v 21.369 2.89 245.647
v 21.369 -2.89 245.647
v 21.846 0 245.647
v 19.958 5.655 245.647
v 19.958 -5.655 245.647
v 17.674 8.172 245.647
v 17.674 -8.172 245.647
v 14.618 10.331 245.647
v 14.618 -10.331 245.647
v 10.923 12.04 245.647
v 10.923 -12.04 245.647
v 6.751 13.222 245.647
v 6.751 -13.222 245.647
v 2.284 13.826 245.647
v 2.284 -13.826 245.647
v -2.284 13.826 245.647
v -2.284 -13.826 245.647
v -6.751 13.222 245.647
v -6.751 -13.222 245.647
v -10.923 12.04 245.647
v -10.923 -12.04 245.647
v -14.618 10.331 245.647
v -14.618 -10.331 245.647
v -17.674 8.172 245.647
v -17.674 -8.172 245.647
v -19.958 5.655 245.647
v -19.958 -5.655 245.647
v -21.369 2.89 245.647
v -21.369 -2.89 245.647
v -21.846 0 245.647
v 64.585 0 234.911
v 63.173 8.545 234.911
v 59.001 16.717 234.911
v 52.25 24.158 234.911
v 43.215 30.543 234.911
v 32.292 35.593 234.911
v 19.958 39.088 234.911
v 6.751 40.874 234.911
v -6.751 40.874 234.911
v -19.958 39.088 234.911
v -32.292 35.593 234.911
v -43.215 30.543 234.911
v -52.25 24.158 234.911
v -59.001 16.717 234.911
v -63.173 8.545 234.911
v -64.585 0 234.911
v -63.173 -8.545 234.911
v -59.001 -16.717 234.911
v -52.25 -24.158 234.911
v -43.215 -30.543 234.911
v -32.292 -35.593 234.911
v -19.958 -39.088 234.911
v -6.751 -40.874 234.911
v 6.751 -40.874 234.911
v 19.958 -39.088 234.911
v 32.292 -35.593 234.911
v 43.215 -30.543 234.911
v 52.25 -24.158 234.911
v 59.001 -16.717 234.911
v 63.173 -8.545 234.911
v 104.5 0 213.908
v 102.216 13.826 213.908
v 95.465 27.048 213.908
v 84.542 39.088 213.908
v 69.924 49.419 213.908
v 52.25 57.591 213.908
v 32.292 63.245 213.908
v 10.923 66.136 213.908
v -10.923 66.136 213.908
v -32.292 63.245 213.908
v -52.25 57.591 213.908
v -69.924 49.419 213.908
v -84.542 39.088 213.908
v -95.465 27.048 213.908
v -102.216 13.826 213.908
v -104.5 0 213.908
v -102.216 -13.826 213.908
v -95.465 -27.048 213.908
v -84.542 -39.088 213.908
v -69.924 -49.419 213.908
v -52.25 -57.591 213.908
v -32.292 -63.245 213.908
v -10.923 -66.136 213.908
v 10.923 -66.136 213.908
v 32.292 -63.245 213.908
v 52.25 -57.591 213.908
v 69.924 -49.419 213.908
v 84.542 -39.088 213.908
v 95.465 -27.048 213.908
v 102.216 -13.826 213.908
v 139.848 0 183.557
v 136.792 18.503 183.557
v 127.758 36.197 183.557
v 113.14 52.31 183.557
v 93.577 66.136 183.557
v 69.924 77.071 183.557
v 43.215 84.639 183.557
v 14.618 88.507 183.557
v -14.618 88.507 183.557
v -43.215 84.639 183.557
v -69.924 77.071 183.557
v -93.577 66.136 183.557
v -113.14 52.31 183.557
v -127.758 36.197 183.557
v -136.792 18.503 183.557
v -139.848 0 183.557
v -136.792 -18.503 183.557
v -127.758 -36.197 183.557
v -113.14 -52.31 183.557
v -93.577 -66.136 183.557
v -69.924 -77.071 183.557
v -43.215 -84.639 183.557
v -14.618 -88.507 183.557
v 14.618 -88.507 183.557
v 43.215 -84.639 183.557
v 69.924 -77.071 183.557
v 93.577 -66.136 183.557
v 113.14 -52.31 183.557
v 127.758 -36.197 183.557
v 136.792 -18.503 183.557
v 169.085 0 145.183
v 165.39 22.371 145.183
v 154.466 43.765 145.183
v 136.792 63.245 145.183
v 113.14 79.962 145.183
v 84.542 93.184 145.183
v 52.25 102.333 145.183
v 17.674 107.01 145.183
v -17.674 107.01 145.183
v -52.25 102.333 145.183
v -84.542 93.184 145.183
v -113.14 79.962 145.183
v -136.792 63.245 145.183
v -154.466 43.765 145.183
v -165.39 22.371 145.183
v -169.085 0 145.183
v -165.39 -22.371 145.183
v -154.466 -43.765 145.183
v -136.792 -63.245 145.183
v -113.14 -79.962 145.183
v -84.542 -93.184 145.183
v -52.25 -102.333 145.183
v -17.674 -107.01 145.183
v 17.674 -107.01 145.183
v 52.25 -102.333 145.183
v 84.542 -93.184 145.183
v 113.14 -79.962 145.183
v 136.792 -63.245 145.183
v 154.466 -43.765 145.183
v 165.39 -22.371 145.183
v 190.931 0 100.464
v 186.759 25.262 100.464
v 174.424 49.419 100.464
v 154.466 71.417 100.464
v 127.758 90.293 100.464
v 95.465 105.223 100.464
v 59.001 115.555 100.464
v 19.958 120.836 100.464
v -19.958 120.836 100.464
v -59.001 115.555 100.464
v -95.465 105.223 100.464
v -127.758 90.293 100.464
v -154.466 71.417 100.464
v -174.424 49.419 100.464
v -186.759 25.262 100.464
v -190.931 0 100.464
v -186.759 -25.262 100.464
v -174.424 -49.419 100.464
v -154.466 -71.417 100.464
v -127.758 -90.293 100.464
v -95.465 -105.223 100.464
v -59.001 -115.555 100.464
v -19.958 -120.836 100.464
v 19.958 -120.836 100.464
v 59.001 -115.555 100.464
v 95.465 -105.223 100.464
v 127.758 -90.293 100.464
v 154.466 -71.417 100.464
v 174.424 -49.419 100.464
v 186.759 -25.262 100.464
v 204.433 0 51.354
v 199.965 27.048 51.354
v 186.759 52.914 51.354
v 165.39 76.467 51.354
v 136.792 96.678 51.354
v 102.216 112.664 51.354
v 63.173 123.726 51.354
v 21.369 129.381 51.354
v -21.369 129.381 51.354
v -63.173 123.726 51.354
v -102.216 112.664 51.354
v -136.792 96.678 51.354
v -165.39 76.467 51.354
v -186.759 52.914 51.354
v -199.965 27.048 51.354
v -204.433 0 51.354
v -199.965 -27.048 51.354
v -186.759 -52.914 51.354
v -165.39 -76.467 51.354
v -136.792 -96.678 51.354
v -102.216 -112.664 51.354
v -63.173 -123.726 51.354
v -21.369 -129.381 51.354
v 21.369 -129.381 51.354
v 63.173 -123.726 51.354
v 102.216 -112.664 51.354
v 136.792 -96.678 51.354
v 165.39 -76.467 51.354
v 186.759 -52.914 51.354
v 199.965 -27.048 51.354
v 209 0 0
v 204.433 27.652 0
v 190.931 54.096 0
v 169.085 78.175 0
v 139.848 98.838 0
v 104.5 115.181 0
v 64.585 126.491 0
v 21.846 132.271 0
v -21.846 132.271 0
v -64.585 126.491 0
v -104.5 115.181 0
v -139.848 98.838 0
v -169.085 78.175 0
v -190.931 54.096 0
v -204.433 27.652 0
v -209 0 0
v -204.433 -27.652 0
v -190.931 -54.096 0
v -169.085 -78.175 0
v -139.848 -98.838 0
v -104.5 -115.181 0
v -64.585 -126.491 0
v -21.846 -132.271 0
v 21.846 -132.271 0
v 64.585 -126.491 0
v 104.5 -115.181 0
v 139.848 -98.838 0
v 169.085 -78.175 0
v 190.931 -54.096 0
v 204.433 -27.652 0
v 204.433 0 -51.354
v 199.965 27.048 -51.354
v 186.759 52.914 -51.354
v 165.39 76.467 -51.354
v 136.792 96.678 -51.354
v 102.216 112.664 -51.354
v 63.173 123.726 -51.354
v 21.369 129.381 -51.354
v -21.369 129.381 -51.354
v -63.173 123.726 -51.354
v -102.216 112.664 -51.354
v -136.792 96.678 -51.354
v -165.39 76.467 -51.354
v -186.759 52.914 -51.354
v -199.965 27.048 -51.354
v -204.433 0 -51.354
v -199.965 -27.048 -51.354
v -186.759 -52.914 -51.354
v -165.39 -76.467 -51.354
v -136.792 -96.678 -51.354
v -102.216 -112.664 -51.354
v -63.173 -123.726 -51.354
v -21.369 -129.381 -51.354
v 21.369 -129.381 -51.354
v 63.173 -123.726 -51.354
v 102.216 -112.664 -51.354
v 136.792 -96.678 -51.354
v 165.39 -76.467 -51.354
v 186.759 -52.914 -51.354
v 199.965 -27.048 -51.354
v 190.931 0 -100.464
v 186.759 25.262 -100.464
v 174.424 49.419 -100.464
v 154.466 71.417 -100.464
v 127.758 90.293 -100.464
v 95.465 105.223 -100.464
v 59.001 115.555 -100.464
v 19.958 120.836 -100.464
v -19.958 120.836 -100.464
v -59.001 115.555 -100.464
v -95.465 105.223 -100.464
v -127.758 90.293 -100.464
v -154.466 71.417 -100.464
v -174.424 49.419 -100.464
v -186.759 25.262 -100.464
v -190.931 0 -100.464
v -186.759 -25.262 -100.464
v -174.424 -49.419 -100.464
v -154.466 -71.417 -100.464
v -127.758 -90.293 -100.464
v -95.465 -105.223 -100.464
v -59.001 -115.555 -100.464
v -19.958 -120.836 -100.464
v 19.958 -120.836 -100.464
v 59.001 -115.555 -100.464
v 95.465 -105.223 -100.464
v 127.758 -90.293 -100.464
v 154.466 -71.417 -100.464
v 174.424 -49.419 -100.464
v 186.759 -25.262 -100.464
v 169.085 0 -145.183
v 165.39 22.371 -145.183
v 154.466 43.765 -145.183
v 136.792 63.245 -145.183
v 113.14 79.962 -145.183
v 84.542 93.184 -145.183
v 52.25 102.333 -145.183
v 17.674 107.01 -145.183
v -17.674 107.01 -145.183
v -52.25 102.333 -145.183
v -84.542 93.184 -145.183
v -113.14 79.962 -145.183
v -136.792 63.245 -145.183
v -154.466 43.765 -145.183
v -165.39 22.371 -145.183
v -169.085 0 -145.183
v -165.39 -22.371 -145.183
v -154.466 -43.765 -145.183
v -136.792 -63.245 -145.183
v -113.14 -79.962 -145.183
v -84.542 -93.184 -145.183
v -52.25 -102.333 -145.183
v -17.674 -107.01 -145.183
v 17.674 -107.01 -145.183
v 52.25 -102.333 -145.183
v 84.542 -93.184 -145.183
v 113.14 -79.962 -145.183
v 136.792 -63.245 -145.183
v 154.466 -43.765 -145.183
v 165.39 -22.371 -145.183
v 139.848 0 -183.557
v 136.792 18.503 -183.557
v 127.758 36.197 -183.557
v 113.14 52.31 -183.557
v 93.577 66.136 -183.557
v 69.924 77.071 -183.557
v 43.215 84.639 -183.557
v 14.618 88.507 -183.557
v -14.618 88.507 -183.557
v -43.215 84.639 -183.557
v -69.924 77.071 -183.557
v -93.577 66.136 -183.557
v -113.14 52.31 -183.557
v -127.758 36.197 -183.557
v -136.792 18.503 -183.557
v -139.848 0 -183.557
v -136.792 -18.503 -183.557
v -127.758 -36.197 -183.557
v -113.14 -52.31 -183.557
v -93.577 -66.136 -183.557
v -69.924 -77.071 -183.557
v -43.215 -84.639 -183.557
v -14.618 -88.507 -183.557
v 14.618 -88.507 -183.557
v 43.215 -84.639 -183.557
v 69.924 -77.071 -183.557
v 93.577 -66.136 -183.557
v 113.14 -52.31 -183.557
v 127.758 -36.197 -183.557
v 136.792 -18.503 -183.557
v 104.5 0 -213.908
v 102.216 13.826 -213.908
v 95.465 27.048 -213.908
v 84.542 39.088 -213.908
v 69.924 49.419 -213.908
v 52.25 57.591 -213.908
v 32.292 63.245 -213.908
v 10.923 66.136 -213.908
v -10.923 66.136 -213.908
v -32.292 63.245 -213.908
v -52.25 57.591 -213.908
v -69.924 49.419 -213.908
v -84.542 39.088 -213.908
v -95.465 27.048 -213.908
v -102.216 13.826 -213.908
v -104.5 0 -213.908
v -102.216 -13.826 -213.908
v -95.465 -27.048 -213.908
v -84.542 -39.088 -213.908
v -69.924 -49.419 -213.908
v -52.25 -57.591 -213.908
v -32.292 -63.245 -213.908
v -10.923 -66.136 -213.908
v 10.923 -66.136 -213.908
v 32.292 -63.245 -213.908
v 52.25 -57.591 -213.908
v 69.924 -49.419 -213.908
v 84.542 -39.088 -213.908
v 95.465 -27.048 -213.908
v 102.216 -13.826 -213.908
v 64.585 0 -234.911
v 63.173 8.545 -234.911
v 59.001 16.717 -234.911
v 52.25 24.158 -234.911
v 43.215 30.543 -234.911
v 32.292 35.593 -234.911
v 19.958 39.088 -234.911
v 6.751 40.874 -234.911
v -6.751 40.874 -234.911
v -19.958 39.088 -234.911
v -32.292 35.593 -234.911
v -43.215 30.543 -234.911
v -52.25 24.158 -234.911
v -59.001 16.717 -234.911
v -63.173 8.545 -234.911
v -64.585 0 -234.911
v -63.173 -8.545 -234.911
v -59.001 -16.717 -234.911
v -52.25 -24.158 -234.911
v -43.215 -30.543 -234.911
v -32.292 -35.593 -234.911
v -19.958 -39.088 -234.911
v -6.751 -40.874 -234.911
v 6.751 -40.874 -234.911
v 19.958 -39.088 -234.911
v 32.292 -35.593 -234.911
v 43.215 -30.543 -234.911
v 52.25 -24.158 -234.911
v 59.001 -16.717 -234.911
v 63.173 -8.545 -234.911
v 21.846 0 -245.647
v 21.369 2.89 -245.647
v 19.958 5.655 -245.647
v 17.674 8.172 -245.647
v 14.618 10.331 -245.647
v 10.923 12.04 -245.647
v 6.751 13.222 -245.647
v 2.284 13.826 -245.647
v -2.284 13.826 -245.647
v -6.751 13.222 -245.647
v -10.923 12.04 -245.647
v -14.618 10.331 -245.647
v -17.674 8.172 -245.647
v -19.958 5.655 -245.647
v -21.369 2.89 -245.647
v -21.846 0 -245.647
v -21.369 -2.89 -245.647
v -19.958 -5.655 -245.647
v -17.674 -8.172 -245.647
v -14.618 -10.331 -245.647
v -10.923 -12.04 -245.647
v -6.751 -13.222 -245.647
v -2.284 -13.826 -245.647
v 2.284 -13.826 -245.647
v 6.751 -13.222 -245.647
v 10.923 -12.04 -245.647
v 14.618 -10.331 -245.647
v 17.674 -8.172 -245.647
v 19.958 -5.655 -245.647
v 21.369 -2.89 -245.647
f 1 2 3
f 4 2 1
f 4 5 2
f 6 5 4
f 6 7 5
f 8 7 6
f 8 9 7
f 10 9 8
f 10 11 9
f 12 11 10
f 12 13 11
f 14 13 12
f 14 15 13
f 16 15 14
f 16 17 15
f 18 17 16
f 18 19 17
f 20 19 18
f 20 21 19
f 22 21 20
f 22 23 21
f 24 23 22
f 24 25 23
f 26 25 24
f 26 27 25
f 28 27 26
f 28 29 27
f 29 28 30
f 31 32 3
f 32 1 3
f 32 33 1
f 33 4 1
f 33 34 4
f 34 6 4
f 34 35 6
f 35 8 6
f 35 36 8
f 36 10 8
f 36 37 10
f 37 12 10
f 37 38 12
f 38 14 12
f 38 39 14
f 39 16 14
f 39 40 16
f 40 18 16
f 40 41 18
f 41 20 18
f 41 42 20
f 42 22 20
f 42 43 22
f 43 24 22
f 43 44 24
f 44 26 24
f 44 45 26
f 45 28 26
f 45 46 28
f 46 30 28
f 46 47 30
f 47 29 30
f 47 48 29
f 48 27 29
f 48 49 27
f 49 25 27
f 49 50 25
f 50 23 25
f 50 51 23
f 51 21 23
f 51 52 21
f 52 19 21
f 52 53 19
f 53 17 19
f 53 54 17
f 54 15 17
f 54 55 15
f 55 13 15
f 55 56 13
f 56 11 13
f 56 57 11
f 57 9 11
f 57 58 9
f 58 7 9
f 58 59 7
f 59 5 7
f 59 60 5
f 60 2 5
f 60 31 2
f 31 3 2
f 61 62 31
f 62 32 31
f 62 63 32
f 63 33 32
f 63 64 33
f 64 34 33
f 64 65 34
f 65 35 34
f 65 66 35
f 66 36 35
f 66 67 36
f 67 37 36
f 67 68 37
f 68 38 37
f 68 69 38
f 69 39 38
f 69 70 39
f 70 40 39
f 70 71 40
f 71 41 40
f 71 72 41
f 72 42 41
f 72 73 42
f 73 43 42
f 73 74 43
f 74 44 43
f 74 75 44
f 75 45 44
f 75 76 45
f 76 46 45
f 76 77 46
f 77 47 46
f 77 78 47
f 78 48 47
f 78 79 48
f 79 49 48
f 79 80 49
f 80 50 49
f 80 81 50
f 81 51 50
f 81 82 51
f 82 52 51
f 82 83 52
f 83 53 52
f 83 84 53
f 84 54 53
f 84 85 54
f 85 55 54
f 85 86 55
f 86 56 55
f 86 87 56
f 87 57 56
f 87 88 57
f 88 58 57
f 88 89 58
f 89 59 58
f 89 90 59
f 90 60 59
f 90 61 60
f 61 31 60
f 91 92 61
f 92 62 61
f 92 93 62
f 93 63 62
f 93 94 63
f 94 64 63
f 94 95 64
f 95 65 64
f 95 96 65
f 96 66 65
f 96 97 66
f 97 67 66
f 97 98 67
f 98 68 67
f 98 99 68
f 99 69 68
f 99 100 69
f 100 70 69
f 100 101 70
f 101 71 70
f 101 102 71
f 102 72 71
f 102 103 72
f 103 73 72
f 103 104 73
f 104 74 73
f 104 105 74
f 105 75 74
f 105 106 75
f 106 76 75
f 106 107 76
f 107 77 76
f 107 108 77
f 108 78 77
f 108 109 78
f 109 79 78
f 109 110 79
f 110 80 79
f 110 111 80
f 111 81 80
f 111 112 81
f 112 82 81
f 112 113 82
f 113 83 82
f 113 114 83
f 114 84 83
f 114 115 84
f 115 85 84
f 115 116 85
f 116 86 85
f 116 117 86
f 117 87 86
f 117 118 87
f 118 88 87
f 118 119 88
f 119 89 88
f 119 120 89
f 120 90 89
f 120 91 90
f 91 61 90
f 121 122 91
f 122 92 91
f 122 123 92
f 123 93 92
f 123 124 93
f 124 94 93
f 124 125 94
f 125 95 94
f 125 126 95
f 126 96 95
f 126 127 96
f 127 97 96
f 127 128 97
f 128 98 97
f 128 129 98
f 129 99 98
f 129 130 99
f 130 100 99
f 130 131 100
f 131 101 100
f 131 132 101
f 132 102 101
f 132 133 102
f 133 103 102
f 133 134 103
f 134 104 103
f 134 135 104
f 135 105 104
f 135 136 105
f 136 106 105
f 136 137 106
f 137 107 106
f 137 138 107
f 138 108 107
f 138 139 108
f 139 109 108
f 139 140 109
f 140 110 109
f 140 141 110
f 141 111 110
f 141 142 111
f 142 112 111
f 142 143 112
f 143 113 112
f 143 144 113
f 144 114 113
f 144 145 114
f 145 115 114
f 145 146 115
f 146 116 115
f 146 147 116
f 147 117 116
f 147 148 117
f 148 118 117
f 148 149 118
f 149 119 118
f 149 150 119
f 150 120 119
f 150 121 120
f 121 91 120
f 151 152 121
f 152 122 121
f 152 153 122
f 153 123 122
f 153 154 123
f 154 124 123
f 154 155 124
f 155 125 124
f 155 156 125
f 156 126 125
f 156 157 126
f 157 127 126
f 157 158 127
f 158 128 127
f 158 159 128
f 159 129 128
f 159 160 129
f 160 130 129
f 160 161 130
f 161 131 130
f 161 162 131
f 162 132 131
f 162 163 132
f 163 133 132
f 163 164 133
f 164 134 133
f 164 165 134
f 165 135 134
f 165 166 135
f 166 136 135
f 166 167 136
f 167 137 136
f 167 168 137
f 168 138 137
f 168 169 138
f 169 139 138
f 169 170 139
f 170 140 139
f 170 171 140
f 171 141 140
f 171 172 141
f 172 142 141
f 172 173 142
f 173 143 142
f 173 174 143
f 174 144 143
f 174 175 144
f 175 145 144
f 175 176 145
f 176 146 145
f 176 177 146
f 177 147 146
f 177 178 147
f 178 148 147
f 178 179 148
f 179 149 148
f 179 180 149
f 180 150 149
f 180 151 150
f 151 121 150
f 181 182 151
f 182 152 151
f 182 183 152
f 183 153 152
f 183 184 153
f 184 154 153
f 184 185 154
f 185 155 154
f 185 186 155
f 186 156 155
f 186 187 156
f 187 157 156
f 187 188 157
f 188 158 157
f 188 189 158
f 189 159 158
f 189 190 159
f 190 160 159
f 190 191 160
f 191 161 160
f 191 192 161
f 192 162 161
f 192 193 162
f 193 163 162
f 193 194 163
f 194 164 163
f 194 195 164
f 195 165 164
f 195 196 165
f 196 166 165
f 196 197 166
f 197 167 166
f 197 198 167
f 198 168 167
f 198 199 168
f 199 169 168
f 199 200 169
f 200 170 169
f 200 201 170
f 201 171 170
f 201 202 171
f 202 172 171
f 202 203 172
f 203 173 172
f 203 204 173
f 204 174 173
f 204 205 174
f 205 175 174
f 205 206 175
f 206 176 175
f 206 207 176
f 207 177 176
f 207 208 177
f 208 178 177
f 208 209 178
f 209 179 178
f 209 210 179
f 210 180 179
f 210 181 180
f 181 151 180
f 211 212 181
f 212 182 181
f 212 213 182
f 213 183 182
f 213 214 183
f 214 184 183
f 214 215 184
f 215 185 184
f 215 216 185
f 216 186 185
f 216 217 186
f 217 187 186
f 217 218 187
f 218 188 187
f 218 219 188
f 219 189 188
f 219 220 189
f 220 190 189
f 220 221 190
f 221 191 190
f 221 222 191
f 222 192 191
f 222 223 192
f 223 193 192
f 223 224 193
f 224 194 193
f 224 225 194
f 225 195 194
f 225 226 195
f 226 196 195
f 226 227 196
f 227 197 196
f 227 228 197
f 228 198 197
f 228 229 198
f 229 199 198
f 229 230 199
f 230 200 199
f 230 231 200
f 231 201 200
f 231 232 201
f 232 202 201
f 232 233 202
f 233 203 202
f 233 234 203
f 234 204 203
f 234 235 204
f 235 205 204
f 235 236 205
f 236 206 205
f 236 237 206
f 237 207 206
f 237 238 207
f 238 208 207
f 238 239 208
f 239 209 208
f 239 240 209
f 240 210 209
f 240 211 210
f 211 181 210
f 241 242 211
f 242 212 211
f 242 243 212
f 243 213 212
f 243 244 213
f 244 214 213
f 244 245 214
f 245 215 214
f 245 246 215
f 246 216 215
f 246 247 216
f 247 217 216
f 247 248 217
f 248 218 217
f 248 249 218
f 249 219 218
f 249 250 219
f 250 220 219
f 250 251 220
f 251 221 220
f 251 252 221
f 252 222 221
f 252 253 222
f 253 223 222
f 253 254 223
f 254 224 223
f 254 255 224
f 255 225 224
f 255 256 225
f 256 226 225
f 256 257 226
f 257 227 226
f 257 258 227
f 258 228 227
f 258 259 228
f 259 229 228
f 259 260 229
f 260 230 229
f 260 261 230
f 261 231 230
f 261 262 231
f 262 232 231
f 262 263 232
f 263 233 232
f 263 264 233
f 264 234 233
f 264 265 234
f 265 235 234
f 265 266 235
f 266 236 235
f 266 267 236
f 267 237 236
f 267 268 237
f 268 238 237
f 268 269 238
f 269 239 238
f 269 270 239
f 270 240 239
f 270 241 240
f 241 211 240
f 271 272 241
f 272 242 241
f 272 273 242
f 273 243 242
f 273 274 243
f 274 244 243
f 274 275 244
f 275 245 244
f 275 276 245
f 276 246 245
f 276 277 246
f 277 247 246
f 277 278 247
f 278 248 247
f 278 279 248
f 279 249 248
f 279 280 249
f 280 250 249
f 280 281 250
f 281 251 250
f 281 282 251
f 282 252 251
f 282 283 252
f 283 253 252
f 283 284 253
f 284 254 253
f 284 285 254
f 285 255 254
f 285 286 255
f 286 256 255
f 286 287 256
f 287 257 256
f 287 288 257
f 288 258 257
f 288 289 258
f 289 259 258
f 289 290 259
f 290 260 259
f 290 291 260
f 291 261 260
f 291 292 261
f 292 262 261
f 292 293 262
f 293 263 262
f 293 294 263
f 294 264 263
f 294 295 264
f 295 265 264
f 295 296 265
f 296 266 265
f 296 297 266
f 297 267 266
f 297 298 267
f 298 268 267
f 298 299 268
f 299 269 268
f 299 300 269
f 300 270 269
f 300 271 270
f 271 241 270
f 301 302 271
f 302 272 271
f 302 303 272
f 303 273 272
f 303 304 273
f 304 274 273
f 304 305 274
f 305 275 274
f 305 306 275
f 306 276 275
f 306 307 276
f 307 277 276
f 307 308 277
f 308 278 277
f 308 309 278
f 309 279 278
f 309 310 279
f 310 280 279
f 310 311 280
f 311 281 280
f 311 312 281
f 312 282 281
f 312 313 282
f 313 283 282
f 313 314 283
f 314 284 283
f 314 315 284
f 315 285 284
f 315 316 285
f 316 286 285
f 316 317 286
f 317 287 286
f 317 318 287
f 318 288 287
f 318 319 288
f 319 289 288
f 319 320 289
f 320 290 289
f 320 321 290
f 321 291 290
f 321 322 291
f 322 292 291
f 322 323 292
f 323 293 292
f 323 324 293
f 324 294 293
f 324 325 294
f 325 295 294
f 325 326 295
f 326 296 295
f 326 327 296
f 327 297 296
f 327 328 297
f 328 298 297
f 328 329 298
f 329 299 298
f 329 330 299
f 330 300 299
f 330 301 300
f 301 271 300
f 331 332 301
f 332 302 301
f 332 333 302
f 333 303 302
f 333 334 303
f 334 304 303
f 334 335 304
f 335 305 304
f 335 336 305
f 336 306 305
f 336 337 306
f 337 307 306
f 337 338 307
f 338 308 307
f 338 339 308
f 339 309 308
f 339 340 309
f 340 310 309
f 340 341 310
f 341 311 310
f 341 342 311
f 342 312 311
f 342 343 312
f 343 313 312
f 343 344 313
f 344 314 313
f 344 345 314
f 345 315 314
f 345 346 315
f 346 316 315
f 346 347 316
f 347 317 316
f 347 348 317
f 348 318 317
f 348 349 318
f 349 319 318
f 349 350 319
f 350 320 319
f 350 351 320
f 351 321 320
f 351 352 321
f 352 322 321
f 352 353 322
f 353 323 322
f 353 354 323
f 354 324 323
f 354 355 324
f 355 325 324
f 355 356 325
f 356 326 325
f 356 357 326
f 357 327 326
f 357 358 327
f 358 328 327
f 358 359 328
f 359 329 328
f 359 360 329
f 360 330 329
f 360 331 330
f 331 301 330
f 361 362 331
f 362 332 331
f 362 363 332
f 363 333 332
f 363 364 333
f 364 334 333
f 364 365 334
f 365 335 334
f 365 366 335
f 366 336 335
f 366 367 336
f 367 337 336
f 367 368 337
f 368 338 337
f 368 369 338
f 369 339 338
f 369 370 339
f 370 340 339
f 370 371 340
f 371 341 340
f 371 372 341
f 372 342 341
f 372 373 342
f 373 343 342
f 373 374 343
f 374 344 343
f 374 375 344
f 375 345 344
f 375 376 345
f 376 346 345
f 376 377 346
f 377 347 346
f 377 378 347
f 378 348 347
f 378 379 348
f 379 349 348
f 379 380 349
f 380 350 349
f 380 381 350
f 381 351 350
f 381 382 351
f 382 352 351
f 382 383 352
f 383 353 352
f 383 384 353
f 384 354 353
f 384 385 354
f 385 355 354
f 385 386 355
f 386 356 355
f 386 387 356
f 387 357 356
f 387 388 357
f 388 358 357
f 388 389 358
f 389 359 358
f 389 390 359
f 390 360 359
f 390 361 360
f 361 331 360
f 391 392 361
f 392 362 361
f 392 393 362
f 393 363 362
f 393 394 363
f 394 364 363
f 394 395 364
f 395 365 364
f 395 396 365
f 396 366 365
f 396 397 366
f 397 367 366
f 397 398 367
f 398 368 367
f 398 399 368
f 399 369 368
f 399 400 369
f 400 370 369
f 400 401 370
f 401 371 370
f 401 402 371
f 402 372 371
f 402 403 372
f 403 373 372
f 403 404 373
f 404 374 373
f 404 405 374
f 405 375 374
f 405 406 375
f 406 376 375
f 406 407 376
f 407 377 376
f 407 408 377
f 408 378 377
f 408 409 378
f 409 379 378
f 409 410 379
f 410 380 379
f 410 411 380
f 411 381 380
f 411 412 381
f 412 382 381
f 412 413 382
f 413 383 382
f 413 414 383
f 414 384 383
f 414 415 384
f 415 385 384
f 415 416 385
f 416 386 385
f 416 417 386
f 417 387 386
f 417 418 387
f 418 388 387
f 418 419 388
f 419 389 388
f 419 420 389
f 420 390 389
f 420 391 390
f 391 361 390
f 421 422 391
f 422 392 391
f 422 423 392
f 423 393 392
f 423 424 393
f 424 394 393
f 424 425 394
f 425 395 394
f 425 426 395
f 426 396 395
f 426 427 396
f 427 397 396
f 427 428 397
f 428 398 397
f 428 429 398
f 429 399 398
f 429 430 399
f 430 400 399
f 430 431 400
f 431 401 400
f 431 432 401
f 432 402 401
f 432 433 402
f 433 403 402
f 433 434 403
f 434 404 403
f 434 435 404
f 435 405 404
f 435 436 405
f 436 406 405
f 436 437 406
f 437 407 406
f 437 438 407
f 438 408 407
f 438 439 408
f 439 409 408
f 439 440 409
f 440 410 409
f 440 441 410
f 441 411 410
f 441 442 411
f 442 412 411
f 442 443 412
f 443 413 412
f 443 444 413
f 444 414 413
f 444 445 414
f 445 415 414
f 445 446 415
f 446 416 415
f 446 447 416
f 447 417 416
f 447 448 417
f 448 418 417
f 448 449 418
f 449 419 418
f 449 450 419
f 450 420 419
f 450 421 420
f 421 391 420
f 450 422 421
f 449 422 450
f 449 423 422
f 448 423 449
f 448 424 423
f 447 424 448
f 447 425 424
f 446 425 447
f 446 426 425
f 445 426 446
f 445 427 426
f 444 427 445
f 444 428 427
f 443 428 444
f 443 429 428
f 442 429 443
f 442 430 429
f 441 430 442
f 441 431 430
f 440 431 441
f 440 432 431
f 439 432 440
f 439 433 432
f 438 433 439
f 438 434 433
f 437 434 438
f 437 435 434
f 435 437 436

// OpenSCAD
// Generated by SolidPython 1.0.1 on 2020-07-29 00:46:49


scale(v = [11, 7, 13]) {
	sphere(r = 19);
}
/***********************************************
*********      SolidPython code:      **********
************************************************
 
# import packages: SolidPython
from solid import *
from solid.utils import *
from itertools import chain, combinations, permutations


class Resize:

    def __init__(self, scad_file):
        self.scad_file = scad_file
        #self.scad_file = import_scad(scad_file)
        # cone/cylinder param:
        self.r1 = 0
        self.r2 = 0
        self.h = 0
        # rectangular prism param:
        self.w = 0
        self.l = 0
        # ellipse param:
        self.r = 0

    # import OpenScad code (file name corresponds to shape)


    # classify shape + parameters
    def assign(self, param1, param2, param3):
        if self.scad_file == 'cone.scad':
            self.r1 = param1
            self.r2 = param2
            self.h = param3
        elif self.scad_file == 'cylinder.scad':
            self.r1 = param1
            self.r2 = param2
            self.h = param3
        elif self.scad_file == 'rectangularPrism.scad':
            self.h = param1
            self.l = param2
            self.w = param3
        else:
            self.r = param1
            self.h = param2

    # resize parameters
    def iterate(self):
        x = range(3, 20, 2)
        i = 1
        if self.scad_file == 'cone.scad':
            tempList = list(permutations(x, 2))
            for temp in tempList:
                param1 = temp[0]
                param2 = temp[1]
                filepath = 'produced_scad_files/' + 'cone' + str(param1) + '_' + str(param2) + '_' + '.scad'
                scad_render_to_file(cylinder(h=param1, r1=param2, r2=0), filepath)

        elif self.scad_file == 'cylinder.scad':
            tempList = list(permutations(x, 3))
            for temp in tempList:
                param1 = temp[0]
                param2 = temp[1]
                filepath = 'produced_scad_files/' + 'cylinder' + str(param1) + '_' + str(param2) + '_' + '.scad'
                scad_render_to_file(cylinder(h=param1, r1=param2, r2=param2), filepath)

        elif self.scad_file == 'rectangularPrism.scad':
            tempList = list(permutations(x, 3))
            for temp in tempList:
                param1 = temp[0]
                param2 = temp[1]
                param3 = temp[2]
                filepath = 'produced_scad_files/' + 'rectangularPrism' + str(param1) + '_' + str(param2) + '_' + str(
                    param3) + '.scad'
                scad_render_to_file(cube(size=(param1, param2, param3)), filepath)

        elif self.scad_file == 'ellipse.scad':
            tempList = list(permutations(x, 4))
            for temp in tempList:
                param1 = temp[0]
                param2 = temp[1]
                param3 = temp[2]
                param4 = temp[3]
                filepath = 'produced_scad_files/' + 'ellipse' + str(param1) + '_' + str(param2) + '_' + str(param3) + '_' + str(param4) + '.scad'
                scad_render_to_file(scale([param1, param2, param3])(sphere(r=param4)), filepath)

    def render_to_scadfile(self):
        scad_render_to_file(scad, 'example.scad') 
 
************************************************/
